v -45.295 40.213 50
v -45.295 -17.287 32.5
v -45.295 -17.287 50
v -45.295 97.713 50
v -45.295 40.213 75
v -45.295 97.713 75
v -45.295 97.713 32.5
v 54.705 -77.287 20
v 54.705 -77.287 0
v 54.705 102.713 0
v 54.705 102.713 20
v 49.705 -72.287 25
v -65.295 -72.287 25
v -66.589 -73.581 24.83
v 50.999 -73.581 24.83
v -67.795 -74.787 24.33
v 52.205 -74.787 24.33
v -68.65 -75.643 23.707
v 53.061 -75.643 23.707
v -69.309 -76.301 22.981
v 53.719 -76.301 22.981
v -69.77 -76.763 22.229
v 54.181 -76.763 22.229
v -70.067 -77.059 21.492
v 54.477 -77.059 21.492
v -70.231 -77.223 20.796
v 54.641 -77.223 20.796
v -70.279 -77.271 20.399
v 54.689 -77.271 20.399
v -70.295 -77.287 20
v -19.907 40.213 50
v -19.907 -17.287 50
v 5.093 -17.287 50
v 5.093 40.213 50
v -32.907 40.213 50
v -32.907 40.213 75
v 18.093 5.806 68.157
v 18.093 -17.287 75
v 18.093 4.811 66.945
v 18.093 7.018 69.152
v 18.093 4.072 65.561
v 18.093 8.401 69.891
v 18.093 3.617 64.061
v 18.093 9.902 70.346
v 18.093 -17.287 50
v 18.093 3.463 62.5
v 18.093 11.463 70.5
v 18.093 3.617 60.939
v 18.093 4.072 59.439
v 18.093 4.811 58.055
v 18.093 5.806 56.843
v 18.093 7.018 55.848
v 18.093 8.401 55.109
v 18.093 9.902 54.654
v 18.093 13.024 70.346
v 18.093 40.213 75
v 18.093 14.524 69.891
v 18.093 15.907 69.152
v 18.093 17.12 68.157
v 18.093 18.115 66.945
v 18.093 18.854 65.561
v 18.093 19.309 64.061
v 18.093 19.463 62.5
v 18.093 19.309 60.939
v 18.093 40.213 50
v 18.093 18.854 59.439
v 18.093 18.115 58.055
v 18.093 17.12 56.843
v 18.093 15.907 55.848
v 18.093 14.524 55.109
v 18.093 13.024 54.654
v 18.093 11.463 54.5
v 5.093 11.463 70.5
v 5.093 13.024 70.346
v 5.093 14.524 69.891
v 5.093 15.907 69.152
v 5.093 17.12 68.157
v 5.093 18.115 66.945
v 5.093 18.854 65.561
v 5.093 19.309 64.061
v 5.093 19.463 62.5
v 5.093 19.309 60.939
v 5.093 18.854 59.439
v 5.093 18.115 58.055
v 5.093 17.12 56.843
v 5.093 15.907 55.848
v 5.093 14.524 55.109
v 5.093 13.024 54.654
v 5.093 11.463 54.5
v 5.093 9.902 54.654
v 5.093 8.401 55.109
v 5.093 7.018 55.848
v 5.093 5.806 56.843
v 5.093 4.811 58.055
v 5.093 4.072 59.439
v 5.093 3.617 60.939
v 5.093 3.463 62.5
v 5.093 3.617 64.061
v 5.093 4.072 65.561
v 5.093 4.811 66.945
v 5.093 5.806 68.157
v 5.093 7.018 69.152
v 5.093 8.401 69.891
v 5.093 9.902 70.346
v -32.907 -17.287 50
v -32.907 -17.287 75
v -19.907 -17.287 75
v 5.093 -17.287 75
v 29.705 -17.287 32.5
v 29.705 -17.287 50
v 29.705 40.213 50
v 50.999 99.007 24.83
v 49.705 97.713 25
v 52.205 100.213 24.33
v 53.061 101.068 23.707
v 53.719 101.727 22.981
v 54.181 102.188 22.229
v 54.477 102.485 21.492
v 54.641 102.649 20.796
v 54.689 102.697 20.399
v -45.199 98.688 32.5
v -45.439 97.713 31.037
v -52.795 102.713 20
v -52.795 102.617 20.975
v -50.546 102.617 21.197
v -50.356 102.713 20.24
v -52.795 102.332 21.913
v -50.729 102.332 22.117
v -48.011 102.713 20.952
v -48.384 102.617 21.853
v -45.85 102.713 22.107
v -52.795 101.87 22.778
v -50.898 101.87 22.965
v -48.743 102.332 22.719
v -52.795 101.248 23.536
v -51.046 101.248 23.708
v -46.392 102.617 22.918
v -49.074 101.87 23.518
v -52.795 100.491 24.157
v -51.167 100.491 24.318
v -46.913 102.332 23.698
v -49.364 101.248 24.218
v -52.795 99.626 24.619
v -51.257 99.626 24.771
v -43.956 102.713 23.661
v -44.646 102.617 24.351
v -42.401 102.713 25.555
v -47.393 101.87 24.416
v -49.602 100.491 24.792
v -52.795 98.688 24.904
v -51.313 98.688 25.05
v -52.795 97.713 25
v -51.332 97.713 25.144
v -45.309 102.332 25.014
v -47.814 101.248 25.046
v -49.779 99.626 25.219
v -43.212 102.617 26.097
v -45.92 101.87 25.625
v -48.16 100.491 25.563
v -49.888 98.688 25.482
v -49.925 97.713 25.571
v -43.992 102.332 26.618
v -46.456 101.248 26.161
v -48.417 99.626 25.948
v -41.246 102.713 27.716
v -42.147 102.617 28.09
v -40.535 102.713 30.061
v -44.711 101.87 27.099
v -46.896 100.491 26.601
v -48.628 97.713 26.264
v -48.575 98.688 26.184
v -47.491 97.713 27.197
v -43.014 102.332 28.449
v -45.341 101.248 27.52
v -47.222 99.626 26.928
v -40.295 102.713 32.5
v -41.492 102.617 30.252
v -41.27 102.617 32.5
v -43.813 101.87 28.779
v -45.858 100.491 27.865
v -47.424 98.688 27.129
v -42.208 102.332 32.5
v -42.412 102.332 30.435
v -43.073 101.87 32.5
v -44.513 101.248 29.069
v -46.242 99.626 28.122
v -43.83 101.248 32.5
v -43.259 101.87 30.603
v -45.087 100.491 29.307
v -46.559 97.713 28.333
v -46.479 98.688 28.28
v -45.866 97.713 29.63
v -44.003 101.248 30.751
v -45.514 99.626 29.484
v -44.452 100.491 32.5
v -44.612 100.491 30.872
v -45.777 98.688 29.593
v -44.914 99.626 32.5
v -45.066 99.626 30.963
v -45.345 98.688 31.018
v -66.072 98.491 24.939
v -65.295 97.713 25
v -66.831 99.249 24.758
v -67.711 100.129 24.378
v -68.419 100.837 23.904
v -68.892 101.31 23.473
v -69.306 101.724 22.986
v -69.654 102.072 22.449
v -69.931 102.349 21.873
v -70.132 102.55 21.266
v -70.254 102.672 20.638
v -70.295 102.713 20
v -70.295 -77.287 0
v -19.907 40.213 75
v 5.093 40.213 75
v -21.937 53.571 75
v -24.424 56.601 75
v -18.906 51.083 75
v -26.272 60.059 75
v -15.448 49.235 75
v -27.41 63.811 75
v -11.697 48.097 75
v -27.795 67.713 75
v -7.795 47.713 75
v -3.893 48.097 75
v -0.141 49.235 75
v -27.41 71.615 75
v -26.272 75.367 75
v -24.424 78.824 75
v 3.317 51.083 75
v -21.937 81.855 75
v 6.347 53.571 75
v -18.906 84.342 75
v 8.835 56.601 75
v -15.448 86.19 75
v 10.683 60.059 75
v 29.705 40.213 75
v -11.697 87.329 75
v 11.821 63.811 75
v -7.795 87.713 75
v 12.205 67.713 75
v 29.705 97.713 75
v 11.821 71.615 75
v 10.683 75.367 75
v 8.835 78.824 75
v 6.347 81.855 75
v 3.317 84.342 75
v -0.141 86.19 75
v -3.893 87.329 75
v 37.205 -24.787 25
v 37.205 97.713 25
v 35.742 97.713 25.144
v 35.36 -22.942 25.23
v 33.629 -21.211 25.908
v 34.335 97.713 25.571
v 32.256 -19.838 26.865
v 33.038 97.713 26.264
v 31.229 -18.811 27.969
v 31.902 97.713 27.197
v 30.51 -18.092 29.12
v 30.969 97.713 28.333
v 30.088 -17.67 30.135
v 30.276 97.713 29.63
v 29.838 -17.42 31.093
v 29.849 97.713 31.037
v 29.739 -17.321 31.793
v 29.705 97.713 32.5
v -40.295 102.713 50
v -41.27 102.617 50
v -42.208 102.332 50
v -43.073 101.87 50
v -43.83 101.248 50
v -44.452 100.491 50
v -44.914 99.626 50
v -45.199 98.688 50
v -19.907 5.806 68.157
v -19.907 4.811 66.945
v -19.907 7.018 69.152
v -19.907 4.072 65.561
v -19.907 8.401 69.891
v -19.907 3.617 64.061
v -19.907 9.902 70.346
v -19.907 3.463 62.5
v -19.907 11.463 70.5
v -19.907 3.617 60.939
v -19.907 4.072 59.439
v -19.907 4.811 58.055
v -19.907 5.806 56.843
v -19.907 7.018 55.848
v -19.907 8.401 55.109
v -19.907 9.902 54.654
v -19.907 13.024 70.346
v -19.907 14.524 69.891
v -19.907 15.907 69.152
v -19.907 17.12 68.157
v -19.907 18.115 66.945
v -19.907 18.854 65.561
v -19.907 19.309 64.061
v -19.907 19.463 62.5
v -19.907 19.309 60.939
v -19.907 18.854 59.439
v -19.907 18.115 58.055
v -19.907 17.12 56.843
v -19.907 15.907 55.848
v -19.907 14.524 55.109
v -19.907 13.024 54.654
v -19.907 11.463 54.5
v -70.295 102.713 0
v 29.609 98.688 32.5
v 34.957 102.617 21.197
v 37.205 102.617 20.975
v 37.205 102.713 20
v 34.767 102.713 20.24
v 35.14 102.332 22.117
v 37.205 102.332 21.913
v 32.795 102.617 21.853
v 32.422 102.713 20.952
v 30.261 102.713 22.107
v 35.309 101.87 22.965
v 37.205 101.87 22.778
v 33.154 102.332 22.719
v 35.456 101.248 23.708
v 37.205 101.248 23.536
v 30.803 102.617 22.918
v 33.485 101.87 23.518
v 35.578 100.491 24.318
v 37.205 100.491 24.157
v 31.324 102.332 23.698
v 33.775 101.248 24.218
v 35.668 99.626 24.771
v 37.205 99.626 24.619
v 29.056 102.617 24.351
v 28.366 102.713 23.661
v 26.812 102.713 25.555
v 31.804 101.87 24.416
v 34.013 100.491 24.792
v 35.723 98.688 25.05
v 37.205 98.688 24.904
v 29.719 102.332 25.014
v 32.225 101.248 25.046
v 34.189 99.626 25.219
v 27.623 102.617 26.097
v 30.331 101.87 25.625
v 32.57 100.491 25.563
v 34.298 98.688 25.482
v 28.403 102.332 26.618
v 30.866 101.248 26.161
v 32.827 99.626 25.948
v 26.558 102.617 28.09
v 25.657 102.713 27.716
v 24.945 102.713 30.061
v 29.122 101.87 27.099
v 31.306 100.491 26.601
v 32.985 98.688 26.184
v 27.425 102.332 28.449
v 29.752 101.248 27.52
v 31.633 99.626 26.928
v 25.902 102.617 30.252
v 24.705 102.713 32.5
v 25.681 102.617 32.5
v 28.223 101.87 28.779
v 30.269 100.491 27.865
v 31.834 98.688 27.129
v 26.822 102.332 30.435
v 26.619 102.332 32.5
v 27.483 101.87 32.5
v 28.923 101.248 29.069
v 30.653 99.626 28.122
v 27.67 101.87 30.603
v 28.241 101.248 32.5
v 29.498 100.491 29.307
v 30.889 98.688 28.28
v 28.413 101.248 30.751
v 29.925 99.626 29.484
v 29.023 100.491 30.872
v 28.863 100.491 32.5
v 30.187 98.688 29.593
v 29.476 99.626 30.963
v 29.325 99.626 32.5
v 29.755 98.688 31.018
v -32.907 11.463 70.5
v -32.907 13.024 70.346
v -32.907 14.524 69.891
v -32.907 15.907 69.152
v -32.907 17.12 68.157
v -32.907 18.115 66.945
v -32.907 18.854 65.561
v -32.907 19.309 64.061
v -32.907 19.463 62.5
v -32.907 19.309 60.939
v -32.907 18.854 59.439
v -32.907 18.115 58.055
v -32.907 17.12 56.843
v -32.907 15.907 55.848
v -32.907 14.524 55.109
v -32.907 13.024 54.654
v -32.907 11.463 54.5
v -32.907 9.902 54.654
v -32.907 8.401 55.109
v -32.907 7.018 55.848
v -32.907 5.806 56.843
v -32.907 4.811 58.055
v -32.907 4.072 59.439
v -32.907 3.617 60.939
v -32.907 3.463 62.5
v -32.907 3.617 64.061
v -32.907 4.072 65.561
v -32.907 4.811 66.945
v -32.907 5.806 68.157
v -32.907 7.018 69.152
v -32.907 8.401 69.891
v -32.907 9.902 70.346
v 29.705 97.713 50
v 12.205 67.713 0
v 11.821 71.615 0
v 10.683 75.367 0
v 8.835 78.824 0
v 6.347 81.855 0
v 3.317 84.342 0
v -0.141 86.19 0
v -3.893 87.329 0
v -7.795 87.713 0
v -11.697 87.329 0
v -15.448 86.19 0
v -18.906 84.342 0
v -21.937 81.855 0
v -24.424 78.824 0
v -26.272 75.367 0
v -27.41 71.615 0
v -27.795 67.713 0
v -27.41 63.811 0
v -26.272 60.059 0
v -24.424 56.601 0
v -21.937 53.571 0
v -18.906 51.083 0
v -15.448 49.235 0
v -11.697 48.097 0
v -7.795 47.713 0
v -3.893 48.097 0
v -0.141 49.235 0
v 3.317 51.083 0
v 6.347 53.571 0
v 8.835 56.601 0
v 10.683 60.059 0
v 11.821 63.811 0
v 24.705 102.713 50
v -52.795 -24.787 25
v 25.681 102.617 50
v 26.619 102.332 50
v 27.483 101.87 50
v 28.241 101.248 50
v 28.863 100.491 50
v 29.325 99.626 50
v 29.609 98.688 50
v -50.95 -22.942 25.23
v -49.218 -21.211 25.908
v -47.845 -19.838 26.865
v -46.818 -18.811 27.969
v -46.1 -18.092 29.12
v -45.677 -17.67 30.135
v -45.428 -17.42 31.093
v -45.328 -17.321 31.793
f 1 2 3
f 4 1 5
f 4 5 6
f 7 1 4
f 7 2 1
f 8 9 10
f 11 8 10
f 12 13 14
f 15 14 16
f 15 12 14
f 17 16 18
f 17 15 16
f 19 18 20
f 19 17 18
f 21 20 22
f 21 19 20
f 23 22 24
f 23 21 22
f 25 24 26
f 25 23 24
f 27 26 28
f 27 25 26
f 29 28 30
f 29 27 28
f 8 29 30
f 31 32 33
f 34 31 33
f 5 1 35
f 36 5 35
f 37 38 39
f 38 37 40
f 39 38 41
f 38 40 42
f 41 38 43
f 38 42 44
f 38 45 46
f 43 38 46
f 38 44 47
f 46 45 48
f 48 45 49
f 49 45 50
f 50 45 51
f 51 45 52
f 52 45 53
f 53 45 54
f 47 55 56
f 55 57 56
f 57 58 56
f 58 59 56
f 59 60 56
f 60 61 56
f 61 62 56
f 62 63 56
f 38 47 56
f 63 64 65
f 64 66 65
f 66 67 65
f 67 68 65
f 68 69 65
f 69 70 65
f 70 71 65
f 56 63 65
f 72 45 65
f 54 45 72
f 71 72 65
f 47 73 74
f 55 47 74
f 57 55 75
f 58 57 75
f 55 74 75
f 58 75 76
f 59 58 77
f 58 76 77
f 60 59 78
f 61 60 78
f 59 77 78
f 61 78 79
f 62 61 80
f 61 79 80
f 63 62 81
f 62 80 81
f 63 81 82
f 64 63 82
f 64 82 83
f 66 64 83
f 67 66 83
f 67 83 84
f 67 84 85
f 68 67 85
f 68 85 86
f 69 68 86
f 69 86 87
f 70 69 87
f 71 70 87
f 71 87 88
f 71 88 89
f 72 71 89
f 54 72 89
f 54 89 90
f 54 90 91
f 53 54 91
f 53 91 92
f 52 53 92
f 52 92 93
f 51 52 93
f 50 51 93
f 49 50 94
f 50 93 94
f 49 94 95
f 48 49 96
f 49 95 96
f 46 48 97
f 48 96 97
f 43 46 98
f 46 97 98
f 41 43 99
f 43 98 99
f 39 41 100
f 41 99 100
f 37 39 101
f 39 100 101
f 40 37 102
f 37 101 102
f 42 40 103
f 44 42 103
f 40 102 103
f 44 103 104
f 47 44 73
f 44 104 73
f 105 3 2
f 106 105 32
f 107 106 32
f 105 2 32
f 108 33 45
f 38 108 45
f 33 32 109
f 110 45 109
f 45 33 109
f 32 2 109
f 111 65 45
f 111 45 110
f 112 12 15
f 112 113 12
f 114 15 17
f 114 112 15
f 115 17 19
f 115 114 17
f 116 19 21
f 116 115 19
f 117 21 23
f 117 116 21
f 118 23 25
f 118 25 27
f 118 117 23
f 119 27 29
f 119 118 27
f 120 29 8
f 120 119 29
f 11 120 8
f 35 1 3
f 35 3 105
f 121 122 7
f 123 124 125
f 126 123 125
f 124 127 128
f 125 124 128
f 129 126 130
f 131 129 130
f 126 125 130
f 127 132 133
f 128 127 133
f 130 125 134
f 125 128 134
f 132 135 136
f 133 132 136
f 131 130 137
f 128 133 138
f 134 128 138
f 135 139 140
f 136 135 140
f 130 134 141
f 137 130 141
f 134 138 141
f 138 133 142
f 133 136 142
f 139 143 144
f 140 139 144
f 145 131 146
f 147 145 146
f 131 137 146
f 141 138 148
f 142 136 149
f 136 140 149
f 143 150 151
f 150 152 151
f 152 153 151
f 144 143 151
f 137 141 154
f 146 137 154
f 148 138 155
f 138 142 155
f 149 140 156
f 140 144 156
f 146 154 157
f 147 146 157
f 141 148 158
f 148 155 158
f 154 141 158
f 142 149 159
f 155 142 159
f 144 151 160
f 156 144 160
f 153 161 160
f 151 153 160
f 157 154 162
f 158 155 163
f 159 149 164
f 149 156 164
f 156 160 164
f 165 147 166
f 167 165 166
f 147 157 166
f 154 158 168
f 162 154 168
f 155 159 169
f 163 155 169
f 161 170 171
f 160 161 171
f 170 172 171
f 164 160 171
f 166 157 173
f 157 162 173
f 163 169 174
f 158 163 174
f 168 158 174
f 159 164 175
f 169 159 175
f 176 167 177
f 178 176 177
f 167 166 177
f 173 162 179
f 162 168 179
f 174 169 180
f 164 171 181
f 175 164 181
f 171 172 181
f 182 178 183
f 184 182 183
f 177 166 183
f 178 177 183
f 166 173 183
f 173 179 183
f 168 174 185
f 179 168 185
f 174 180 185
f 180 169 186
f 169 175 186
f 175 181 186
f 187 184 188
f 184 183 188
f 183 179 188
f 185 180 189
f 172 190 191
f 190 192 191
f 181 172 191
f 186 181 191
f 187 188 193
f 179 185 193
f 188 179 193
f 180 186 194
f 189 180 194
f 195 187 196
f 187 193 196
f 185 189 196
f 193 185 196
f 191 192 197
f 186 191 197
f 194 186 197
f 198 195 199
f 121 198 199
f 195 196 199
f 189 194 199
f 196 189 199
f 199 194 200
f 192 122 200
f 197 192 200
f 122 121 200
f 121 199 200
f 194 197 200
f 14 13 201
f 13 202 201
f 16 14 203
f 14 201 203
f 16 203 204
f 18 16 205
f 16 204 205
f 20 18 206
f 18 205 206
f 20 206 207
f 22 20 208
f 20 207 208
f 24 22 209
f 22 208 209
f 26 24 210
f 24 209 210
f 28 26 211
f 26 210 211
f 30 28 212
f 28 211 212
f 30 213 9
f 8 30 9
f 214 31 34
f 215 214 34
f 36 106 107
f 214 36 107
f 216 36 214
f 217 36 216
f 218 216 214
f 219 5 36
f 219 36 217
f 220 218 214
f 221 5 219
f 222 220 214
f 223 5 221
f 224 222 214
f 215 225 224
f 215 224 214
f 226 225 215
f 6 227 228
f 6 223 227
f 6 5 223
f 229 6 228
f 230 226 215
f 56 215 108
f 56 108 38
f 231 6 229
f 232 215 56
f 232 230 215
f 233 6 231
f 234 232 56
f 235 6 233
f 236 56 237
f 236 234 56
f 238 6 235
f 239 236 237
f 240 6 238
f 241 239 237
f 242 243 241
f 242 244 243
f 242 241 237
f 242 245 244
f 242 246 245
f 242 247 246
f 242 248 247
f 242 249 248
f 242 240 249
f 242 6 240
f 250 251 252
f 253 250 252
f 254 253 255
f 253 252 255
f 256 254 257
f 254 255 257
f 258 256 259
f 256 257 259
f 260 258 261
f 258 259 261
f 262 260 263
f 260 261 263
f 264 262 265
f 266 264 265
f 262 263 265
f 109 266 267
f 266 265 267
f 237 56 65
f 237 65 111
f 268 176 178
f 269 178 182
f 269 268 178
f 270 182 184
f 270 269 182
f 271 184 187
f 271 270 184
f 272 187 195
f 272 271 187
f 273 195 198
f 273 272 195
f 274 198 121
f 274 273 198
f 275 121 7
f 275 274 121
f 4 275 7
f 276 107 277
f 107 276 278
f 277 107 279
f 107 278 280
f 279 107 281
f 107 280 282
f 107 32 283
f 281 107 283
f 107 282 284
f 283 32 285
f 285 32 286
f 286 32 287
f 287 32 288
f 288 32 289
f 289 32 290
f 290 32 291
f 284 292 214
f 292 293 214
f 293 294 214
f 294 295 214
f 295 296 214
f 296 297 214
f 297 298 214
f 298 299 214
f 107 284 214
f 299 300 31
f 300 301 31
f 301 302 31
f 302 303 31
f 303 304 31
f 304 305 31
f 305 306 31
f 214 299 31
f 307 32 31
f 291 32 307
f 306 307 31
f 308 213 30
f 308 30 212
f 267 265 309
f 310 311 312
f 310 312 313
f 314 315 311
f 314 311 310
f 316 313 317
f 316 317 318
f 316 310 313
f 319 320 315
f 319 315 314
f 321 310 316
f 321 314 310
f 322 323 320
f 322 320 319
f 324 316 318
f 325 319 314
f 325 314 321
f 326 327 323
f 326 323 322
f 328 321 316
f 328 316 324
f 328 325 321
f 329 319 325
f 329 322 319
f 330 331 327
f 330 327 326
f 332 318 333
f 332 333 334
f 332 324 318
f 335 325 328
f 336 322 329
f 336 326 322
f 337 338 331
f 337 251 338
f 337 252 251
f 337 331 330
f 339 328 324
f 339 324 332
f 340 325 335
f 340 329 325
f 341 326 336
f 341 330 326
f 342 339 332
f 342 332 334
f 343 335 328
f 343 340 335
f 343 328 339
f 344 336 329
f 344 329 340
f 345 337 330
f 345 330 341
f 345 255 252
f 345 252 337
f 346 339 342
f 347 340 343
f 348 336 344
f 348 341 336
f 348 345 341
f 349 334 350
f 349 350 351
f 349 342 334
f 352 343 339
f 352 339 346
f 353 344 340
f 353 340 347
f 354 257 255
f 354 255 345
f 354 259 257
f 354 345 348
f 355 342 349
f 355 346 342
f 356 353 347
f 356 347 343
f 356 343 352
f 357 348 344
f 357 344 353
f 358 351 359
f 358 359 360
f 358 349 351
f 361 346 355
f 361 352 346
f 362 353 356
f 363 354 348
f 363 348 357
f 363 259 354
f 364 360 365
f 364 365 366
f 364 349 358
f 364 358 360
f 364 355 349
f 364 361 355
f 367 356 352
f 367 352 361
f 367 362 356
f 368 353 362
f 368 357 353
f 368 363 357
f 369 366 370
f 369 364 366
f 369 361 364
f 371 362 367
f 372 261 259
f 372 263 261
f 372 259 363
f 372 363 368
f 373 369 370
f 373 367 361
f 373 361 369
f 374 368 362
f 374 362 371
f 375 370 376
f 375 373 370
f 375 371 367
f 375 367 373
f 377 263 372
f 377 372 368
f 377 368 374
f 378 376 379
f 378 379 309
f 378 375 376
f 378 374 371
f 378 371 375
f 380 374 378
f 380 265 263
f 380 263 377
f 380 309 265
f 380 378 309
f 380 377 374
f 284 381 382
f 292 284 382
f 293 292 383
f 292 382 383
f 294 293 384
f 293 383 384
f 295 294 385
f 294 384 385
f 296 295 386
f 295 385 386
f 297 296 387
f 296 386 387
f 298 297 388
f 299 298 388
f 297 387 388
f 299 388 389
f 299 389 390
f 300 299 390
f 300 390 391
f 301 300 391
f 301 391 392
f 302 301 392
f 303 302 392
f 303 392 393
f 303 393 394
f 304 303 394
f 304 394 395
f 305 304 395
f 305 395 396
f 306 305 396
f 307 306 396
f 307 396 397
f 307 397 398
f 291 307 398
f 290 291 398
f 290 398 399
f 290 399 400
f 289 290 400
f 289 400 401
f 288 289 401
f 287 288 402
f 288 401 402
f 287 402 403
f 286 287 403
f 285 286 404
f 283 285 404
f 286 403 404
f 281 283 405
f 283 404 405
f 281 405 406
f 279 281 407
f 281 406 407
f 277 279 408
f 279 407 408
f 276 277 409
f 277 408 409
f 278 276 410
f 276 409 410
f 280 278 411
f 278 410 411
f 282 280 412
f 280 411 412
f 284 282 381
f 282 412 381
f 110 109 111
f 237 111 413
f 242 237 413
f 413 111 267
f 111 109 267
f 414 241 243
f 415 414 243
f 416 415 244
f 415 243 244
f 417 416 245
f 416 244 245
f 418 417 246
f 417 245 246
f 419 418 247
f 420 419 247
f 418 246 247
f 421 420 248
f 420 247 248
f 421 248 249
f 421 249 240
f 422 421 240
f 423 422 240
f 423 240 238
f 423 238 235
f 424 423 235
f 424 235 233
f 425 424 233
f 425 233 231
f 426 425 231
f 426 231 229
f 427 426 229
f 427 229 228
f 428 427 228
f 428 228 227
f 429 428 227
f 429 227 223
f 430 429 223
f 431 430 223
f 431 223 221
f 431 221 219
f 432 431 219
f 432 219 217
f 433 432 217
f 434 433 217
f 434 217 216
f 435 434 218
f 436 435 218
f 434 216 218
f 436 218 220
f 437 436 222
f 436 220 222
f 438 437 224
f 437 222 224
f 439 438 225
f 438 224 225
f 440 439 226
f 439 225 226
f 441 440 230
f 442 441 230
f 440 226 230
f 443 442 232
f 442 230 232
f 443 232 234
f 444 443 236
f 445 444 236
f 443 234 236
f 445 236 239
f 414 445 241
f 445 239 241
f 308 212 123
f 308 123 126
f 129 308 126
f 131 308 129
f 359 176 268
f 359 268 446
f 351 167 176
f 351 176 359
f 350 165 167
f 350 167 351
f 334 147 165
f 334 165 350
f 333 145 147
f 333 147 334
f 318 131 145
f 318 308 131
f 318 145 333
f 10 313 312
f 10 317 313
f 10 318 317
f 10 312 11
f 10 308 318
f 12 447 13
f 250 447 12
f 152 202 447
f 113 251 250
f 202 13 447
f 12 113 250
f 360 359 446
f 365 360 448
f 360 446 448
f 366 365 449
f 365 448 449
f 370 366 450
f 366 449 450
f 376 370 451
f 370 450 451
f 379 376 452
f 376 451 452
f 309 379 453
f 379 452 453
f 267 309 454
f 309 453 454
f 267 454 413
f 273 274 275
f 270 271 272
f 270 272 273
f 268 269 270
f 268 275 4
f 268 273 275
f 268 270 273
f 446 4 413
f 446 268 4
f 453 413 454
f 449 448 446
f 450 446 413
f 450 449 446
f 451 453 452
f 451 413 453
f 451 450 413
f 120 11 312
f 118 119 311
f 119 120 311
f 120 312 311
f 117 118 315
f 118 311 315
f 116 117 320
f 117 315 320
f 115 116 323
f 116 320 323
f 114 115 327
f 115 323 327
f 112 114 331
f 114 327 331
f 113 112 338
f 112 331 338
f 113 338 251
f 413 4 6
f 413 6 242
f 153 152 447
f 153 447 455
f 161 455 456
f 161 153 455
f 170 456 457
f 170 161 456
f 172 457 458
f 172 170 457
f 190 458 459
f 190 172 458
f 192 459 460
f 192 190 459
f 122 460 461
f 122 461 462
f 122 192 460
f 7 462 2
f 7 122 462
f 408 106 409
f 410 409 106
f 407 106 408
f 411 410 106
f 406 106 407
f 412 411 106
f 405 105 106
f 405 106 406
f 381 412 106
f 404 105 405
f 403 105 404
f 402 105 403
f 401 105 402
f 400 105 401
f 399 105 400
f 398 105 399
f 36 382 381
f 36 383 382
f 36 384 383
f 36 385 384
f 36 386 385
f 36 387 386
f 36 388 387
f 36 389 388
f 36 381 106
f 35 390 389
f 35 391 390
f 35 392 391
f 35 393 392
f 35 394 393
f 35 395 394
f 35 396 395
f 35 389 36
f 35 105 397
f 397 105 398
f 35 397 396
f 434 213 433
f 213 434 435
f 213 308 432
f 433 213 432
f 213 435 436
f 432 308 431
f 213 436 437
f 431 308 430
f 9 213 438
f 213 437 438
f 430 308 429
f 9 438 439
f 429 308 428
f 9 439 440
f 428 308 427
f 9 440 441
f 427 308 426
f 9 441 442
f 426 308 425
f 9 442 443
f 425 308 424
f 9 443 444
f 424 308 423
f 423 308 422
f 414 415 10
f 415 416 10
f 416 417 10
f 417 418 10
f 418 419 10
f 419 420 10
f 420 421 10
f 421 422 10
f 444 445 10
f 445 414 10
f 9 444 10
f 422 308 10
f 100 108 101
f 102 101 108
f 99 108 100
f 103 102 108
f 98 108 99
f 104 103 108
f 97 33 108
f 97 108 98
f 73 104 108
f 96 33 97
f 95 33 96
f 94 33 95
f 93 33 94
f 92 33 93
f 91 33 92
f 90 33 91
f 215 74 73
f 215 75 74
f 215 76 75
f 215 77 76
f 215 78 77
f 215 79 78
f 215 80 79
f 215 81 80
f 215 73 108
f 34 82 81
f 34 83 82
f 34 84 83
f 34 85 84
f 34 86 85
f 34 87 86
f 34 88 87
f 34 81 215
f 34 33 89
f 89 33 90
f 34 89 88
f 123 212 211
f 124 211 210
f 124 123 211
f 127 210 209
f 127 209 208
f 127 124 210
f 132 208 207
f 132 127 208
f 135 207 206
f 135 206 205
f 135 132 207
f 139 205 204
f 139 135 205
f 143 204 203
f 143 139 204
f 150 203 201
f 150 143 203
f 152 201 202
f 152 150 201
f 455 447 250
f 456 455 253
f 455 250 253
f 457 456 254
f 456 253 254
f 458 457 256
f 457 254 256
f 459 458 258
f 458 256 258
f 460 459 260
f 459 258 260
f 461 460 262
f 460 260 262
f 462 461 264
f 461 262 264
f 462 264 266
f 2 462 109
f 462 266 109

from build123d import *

# Parameters (mm, degrees)
SKETCH1_W           = 125
SKETCH1_H           = 180
BASE_EXTRUDE_DEPTH  = 25
SKETCH2_W           = 75
SKETCH2_H           = 120
BOSS_EXTRUDE1_DEPTH = 25
FILLET2_R           = 7.5
FILLET4_R           = 5
SKETCH4_W           = 75
SKETCH4_H           = 57.5
BOSS_EXTRUDE2_DEPTH = 25
SKETCH7_R           = 20
CUT_EXTRUDE2_DEPTH  = 105
SKETCH8_W           = 13
SKETCH8_H           = 57.5
BOSS_EXTRUDE4_DEPTH = 25
SKETCH9_R           = 8
CUT_EXTRUDE3_DEPTH  = 80


with BuildPart() as part:
    # Sketch1 → Base-Extrude (new body)
    with BuildSketch(Plane.XY):
        with Locations((-7.794747082, 12.712840467)):
            Rectangle(SKETCH1_W, SKETCH1_H)
    extrude(amount=BASE_EXTRUDE_DEPTH)

    # Sketch2 → Boss-Extrude1 (add)
    with BuildSketch(Plane.XY.offset(25)):
        with Locations((-7.794747082, 42.712840467)):
            Rectangle(SKETCH2_W, SKETCH2_H)
    extrude(amount=BOSS_EXTRUDE1_DEPTH)

    # Fillet2
    fillet2_edges = [part.edges().sort_by_distance(p)[0] for p in [
        (-45.294747082, 42.712840467, 25),
        (-7.794747082, -17.287159533, 25),
        (29.705252918, 42.712840467, 25),
    ]]
    fillet(fillet2_edges, radius=FILLET2_R)

    # Fillet4
    fillet4_edges = [part.edges().sort_by_distance(p)[0] for p in [
        (54.705252918, 12.712840467, 25),
        (-61.544747082, 102.712840467, 25),
        (-45.294747082, 102.712840467, 41.25),
        (29.705252918, 102.712840467, 41.25),
        (31.901952059, 102.712840467, 27.196699141),
        (-47.491446223, 102.712840467, 27.196699141),
        (-70.294747082, 12.712840467, 25),
        (-7.794747082, -77.287159533, 25),
    ]]
    fillet(fillet4_edges, radius=FILLET4_R)

    # Sketch4 → Boss-Extrude2 (add)
    with BuildSketch(Plane.XY.offset(50)):
        with Locations((-7.794747082, 68.962840467)):
            Rectangle(SKETCH4_W, SKETCH4_H)
    extrude(amount=BOSS_EXTRUDE2_DEPTH)

    # Sketch7 → Cut-Extrude2 (cut)
    with BuildSketch(Plane.XY.offset(75)):
        with Locations((-7.794747082, 67.712840467)):
            Circle(SKETCH7_R)
    extrude(amount=-CUT_EXTRUDE2_DEPTH, mode=Mode.SUBTRACT)

    # Sketch8 → Boss-Extrude4 (add)
    with BuildSketch(Plane.XY.offset(50)):
        with Locations((11.592907965, 11.462840467)):
            Rectangle(SKETCH8_W, SKETCH8_H)
        with Locations((-26.407092035, 11.462840467)):
            Rectangle(SKETCH8_W, SKETCH8_H)
    extrude(amount=BOSS_EXTRUDE4_DEPTH)

    # Sketch9 → Cut-Extrude3 (cut)
    with BuildSketch(Plane.ZY.offset(32.907092035)):
        with Locations((62.5, 11.462840467)):
            Circle(SKETCH9_R)
    extrude(amount=-CUT_EXTRUDE3_DEPTH, mode=Mode.SUBTRACT)


solid = part.part
